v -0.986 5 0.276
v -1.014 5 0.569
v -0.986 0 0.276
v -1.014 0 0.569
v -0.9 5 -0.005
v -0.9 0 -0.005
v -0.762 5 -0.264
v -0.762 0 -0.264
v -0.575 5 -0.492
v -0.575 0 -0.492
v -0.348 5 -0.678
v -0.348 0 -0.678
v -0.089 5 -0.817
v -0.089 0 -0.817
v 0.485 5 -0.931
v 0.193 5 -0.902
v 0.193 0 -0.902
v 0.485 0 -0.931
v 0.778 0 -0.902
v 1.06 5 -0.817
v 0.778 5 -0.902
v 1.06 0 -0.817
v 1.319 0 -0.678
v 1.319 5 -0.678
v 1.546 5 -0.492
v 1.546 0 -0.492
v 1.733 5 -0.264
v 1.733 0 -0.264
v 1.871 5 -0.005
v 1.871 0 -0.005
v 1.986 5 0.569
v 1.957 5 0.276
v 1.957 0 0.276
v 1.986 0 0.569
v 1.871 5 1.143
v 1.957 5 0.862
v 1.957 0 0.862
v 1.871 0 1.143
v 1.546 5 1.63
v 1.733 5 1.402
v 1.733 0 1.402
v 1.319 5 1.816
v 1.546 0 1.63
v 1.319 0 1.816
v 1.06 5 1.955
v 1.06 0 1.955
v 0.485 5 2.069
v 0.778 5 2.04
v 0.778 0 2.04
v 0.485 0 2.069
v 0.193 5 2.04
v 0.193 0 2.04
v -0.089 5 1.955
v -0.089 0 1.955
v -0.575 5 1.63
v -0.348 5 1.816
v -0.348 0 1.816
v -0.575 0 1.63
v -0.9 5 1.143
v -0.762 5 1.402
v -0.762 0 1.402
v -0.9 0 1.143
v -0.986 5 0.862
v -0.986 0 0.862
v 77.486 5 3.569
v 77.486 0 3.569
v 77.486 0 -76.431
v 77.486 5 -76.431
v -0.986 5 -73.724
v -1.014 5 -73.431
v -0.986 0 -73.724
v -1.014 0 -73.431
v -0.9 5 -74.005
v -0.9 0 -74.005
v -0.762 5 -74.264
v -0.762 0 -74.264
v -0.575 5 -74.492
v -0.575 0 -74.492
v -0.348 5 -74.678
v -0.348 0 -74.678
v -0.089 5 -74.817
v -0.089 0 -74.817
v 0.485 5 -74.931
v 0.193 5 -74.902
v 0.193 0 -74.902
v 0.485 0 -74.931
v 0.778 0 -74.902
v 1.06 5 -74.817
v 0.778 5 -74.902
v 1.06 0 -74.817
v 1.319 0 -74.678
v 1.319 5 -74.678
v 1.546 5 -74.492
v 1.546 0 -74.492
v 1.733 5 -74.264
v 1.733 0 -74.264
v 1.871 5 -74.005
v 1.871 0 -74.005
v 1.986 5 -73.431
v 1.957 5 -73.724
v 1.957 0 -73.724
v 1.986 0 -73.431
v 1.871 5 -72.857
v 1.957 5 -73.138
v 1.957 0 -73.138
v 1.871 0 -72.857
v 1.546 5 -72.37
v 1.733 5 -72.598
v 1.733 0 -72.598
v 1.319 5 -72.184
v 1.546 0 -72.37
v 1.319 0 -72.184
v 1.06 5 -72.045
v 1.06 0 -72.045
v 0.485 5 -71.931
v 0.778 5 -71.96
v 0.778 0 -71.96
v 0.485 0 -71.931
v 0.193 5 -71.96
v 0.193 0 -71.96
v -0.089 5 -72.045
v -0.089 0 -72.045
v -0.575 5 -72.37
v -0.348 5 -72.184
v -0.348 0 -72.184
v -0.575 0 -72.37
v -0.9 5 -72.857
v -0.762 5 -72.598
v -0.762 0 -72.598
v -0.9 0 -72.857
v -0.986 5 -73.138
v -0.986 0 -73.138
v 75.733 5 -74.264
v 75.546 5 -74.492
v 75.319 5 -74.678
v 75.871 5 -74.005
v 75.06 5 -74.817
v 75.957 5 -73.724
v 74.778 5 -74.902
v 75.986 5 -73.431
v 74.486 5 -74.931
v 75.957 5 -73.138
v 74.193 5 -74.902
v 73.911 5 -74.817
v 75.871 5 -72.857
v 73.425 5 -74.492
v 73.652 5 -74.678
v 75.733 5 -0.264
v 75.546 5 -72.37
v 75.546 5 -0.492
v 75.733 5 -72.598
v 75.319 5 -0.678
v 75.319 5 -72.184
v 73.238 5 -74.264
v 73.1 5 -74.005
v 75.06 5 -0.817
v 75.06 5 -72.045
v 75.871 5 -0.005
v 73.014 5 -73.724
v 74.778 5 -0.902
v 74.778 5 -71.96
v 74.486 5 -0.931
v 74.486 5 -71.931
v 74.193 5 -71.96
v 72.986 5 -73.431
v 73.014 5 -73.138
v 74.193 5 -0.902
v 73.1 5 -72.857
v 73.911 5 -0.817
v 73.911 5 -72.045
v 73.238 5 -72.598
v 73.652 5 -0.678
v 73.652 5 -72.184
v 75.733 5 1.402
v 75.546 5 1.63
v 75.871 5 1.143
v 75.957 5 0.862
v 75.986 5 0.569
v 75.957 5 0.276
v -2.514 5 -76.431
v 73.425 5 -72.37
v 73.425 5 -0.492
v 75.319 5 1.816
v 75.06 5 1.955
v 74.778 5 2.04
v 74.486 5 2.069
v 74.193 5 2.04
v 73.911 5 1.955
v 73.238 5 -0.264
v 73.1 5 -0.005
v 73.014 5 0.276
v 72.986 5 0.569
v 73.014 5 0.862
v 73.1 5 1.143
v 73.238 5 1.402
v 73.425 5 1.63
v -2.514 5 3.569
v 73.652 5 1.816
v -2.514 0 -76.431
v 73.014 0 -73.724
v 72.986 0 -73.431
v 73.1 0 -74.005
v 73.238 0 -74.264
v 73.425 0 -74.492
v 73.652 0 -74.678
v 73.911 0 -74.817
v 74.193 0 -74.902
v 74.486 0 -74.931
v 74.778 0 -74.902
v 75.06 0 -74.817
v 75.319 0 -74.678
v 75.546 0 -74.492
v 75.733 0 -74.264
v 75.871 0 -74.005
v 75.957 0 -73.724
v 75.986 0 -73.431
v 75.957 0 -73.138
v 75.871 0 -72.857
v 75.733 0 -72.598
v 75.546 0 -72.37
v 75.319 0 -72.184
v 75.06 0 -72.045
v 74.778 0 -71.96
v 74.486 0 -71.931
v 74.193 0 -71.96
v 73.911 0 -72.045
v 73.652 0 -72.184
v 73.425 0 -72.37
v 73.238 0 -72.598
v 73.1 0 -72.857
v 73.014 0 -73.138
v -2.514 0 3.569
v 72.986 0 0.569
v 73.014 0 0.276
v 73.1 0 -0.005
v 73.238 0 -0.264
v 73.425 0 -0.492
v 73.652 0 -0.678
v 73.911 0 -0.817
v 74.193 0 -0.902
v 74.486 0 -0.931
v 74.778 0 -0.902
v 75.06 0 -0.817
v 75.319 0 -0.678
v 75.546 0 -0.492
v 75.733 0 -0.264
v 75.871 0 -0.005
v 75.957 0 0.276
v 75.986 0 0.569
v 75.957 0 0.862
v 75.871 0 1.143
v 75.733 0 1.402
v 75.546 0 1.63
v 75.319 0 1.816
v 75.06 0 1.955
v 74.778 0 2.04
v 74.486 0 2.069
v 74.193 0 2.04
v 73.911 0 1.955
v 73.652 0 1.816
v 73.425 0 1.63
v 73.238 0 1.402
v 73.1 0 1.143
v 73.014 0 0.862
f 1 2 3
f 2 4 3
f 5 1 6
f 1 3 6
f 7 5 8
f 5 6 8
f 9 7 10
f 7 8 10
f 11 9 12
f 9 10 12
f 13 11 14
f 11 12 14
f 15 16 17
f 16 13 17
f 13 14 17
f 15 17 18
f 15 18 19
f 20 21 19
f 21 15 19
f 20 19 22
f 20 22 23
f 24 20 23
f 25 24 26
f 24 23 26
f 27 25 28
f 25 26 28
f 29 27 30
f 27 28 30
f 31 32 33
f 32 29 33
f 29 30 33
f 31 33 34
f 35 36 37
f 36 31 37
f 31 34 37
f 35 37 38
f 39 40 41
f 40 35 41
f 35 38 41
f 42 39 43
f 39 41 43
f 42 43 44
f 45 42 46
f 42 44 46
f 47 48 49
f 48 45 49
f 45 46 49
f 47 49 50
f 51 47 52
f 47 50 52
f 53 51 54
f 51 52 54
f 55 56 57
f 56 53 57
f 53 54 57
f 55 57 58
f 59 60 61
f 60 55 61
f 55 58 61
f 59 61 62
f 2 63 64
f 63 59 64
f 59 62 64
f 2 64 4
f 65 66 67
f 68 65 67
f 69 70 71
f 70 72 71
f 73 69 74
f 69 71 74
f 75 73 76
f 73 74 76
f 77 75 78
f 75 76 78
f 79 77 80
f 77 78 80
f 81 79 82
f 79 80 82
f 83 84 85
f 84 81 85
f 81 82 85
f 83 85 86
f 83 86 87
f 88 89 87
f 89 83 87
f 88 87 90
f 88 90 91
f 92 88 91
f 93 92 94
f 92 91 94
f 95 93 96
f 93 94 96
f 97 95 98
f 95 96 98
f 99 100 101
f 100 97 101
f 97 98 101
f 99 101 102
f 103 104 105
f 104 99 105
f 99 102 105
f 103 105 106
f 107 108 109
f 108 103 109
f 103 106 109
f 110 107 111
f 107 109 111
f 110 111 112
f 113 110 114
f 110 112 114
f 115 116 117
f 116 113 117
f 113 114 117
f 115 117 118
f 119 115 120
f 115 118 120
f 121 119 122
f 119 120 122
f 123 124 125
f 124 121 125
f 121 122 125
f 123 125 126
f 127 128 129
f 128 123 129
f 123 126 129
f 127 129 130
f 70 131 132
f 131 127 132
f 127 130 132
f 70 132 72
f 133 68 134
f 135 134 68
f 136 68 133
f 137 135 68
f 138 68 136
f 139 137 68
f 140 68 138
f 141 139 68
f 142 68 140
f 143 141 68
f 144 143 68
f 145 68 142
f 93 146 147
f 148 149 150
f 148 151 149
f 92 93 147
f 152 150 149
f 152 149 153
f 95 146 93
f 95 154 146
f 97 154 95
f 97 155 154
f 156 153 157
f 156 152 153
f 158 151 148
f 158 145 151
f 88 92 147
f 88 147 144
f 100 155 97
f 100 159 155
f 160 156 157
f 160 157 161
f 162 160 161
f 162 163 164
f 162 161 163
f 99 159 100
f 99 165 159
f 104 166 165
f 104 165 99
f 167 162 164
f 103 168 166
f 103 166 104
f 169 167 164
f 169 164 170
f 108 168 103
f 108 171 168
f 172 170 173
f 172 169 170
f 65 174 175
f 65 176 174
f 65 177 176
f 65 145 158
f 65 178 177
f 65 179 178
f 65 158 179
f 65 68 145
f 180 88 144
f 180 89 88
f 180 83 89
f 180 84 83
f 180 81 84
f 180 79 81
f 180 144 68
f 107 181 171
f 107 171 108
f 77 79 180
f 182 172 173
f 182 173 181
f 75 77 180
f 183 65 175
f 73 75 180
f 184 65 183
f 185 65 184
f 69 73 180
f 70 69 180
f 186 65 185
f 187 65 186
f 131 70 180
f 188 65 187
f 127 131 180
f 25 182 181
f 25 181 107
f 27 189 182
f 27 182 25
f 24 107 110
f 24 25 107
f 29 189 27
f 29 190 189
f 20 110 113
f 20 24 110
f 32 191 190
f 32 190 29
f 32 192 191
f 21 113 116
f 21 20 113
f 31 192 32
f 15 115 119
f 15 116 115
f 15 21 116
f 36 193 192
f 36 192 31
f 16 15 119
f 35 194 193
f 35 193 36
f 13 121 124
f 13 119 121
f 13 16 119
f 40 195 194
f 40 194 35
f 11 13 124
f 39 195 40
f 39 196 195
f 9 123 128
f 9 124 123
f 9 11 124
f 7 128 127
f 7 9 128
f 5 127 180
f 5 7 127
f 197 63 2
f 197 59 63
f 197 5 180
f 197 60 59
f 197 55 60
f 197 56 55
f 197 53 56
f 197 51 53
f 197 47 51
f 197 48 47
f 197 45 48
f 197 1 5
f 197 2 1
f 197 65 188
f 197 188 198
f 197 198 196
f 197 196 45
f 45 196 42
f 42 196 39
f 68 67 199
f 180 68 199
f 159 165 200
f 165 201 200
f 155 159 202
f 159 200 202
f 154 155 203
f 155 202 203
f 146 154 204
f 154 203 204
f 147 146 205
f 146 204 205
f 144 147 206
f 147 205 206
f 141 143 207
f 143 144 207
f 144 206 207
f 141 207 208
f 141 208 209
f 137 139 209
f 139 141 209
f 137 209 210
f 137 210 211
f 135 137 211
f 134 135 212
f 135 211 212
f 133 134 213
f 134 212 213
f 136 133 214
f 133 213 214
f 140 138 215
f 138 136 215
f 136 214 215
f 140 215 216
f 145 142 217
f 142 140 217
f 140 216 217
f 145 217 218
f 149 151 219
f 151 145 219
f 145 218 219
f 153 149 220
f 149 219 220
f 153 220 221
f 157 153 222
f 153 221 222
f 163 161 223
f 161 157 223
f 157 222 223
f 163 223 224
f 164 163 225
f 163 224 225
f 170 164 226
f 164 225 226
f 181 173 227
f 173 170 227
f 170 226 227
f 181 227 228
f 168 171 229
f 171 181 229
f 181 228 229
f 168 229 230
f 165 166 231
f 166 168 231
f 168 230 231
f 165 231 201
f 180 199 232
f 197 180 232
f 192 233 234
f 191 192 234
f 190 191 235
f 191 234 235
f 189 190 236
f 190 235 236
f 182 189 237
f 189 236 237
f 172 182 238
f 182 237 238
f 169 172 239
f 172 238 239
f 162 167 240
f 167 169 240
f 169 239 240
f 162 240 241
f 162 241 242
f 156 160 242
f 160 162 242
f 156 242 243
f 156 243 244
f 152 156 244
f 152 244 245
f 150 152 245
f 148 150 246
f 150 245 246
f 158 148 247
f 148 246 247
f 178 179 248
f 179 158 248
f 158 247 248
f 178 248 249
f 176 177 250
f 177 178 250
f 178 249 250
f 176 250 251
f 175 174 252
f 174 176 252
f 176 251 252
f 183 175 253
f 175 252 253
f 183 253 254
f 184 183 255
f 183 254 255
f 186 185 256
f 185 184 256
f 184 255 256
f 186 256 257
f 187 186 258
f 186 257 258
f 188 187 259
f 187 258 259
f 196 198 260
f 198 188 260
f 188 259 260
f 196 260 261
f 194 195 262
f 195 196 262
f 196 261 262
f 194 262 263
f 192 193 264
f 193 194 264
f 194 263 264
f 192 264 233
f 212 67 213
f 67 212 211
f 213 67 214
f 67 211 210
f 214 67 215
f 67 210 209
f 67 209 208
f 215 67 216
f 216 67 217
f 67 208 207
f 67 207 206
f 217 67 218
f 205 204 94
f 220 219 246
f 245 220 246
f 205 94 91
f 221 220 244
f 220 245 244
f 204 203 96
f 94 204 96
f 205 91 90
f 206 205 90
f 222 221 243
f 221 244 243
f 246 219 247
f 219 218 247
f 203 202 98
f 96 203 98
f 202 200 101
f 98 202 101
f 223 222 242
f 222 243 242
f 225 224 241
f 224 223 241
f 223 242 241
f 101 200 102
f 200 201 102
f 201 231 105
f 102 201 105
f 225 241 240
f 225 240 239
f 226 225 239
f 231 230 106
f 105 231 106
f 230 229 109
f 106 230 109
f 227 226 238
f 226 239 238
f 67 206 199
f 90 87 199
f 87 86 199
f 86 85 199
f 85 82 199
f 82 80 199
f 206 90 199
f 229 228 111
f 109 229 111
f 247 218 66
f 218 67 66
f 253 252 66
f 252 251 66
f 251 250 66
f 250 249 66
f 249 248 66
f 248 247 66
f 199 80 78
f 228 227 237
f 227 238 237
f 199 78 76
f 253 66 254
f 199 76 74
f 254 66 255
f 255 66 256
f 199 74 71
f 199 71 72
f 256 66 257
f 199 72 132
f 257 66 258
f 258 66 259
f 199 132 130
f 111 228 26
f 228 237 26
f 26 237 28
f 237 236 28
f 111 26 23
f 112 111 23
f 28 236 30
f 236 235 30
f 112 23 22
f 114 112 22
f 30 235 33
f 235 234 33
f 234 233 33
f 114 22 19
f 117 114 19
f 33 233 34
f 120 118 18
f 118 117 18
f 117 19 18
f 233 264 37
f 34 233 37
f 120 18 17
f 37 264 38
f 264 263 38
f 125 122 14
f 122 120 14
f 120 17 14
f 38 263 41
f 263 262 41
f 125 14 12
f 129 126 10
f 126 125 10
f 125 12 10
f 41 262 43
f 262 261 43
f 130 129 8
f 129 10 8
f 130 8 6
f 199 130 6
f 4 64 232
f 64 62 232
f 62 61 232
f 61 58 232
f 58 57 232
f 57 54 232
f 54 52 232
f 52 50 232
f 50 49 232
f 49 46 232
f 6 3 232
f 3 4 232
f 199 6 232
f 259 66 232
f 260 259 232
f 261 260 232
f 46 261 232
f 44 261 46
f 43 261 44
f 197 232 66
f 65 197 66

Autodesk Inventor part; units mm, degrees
ref_plane "YZ Plane" through (0, 0, 0) normal (1, 0, 0) x (0, 1, 0)
ref_plane "XZ Plane" through (0, 0, 0) normal (0, 1, 0) x (-1, 0, 0)
ref_plane "XY Plane" through (0, 0, 0) normal (0, 0, 1) x (1, 0, 0)
sketch "Sketch1" plane through (0, 0, 0) normal (0, 1, 0) x (-1, 0, 0)
  line L0 (2.5145, 3.569) -> (-77.4855, 3.569)
  line L1 (-77.4855, 3.569) -> (-77.4855, -76.431)
  line L2 (-77.4855, -76.431) -> (2.5145, -76.431)
  line L3 (2.5145, -76.431) -> (2.5145, 3.569)
  circle A0 centre (-0.4855, 0.569) radius 1.5
  circle A1 centre (-0.4855, -73.431) radius 1.5
  circle A2 centre (-74.4855, 0.569) radius 1.5
  circle A3 centre (-74.4855, -73.431) radius 1.5
  point P0 (0, 0)
  dimension "d0" = 80
  dimension "d1" = 80
  dimension "d4" = 3
  dimension "d5" = 3
  dimension "d6" = 3
  dimension "d7" = 3
  dimension "d8" = 3
  dimension "d9" = 3
  dimension "d10" = 3
  dimension "d11" = 3
  dimension "d12" = 3
  dimension "d13" = 3
  dimension "d14" = 3
  dimension "d15" = 3
extrude "Extrusion1" add sketch "Sketch1" along normal blind 5
properties part number "support_balise"
